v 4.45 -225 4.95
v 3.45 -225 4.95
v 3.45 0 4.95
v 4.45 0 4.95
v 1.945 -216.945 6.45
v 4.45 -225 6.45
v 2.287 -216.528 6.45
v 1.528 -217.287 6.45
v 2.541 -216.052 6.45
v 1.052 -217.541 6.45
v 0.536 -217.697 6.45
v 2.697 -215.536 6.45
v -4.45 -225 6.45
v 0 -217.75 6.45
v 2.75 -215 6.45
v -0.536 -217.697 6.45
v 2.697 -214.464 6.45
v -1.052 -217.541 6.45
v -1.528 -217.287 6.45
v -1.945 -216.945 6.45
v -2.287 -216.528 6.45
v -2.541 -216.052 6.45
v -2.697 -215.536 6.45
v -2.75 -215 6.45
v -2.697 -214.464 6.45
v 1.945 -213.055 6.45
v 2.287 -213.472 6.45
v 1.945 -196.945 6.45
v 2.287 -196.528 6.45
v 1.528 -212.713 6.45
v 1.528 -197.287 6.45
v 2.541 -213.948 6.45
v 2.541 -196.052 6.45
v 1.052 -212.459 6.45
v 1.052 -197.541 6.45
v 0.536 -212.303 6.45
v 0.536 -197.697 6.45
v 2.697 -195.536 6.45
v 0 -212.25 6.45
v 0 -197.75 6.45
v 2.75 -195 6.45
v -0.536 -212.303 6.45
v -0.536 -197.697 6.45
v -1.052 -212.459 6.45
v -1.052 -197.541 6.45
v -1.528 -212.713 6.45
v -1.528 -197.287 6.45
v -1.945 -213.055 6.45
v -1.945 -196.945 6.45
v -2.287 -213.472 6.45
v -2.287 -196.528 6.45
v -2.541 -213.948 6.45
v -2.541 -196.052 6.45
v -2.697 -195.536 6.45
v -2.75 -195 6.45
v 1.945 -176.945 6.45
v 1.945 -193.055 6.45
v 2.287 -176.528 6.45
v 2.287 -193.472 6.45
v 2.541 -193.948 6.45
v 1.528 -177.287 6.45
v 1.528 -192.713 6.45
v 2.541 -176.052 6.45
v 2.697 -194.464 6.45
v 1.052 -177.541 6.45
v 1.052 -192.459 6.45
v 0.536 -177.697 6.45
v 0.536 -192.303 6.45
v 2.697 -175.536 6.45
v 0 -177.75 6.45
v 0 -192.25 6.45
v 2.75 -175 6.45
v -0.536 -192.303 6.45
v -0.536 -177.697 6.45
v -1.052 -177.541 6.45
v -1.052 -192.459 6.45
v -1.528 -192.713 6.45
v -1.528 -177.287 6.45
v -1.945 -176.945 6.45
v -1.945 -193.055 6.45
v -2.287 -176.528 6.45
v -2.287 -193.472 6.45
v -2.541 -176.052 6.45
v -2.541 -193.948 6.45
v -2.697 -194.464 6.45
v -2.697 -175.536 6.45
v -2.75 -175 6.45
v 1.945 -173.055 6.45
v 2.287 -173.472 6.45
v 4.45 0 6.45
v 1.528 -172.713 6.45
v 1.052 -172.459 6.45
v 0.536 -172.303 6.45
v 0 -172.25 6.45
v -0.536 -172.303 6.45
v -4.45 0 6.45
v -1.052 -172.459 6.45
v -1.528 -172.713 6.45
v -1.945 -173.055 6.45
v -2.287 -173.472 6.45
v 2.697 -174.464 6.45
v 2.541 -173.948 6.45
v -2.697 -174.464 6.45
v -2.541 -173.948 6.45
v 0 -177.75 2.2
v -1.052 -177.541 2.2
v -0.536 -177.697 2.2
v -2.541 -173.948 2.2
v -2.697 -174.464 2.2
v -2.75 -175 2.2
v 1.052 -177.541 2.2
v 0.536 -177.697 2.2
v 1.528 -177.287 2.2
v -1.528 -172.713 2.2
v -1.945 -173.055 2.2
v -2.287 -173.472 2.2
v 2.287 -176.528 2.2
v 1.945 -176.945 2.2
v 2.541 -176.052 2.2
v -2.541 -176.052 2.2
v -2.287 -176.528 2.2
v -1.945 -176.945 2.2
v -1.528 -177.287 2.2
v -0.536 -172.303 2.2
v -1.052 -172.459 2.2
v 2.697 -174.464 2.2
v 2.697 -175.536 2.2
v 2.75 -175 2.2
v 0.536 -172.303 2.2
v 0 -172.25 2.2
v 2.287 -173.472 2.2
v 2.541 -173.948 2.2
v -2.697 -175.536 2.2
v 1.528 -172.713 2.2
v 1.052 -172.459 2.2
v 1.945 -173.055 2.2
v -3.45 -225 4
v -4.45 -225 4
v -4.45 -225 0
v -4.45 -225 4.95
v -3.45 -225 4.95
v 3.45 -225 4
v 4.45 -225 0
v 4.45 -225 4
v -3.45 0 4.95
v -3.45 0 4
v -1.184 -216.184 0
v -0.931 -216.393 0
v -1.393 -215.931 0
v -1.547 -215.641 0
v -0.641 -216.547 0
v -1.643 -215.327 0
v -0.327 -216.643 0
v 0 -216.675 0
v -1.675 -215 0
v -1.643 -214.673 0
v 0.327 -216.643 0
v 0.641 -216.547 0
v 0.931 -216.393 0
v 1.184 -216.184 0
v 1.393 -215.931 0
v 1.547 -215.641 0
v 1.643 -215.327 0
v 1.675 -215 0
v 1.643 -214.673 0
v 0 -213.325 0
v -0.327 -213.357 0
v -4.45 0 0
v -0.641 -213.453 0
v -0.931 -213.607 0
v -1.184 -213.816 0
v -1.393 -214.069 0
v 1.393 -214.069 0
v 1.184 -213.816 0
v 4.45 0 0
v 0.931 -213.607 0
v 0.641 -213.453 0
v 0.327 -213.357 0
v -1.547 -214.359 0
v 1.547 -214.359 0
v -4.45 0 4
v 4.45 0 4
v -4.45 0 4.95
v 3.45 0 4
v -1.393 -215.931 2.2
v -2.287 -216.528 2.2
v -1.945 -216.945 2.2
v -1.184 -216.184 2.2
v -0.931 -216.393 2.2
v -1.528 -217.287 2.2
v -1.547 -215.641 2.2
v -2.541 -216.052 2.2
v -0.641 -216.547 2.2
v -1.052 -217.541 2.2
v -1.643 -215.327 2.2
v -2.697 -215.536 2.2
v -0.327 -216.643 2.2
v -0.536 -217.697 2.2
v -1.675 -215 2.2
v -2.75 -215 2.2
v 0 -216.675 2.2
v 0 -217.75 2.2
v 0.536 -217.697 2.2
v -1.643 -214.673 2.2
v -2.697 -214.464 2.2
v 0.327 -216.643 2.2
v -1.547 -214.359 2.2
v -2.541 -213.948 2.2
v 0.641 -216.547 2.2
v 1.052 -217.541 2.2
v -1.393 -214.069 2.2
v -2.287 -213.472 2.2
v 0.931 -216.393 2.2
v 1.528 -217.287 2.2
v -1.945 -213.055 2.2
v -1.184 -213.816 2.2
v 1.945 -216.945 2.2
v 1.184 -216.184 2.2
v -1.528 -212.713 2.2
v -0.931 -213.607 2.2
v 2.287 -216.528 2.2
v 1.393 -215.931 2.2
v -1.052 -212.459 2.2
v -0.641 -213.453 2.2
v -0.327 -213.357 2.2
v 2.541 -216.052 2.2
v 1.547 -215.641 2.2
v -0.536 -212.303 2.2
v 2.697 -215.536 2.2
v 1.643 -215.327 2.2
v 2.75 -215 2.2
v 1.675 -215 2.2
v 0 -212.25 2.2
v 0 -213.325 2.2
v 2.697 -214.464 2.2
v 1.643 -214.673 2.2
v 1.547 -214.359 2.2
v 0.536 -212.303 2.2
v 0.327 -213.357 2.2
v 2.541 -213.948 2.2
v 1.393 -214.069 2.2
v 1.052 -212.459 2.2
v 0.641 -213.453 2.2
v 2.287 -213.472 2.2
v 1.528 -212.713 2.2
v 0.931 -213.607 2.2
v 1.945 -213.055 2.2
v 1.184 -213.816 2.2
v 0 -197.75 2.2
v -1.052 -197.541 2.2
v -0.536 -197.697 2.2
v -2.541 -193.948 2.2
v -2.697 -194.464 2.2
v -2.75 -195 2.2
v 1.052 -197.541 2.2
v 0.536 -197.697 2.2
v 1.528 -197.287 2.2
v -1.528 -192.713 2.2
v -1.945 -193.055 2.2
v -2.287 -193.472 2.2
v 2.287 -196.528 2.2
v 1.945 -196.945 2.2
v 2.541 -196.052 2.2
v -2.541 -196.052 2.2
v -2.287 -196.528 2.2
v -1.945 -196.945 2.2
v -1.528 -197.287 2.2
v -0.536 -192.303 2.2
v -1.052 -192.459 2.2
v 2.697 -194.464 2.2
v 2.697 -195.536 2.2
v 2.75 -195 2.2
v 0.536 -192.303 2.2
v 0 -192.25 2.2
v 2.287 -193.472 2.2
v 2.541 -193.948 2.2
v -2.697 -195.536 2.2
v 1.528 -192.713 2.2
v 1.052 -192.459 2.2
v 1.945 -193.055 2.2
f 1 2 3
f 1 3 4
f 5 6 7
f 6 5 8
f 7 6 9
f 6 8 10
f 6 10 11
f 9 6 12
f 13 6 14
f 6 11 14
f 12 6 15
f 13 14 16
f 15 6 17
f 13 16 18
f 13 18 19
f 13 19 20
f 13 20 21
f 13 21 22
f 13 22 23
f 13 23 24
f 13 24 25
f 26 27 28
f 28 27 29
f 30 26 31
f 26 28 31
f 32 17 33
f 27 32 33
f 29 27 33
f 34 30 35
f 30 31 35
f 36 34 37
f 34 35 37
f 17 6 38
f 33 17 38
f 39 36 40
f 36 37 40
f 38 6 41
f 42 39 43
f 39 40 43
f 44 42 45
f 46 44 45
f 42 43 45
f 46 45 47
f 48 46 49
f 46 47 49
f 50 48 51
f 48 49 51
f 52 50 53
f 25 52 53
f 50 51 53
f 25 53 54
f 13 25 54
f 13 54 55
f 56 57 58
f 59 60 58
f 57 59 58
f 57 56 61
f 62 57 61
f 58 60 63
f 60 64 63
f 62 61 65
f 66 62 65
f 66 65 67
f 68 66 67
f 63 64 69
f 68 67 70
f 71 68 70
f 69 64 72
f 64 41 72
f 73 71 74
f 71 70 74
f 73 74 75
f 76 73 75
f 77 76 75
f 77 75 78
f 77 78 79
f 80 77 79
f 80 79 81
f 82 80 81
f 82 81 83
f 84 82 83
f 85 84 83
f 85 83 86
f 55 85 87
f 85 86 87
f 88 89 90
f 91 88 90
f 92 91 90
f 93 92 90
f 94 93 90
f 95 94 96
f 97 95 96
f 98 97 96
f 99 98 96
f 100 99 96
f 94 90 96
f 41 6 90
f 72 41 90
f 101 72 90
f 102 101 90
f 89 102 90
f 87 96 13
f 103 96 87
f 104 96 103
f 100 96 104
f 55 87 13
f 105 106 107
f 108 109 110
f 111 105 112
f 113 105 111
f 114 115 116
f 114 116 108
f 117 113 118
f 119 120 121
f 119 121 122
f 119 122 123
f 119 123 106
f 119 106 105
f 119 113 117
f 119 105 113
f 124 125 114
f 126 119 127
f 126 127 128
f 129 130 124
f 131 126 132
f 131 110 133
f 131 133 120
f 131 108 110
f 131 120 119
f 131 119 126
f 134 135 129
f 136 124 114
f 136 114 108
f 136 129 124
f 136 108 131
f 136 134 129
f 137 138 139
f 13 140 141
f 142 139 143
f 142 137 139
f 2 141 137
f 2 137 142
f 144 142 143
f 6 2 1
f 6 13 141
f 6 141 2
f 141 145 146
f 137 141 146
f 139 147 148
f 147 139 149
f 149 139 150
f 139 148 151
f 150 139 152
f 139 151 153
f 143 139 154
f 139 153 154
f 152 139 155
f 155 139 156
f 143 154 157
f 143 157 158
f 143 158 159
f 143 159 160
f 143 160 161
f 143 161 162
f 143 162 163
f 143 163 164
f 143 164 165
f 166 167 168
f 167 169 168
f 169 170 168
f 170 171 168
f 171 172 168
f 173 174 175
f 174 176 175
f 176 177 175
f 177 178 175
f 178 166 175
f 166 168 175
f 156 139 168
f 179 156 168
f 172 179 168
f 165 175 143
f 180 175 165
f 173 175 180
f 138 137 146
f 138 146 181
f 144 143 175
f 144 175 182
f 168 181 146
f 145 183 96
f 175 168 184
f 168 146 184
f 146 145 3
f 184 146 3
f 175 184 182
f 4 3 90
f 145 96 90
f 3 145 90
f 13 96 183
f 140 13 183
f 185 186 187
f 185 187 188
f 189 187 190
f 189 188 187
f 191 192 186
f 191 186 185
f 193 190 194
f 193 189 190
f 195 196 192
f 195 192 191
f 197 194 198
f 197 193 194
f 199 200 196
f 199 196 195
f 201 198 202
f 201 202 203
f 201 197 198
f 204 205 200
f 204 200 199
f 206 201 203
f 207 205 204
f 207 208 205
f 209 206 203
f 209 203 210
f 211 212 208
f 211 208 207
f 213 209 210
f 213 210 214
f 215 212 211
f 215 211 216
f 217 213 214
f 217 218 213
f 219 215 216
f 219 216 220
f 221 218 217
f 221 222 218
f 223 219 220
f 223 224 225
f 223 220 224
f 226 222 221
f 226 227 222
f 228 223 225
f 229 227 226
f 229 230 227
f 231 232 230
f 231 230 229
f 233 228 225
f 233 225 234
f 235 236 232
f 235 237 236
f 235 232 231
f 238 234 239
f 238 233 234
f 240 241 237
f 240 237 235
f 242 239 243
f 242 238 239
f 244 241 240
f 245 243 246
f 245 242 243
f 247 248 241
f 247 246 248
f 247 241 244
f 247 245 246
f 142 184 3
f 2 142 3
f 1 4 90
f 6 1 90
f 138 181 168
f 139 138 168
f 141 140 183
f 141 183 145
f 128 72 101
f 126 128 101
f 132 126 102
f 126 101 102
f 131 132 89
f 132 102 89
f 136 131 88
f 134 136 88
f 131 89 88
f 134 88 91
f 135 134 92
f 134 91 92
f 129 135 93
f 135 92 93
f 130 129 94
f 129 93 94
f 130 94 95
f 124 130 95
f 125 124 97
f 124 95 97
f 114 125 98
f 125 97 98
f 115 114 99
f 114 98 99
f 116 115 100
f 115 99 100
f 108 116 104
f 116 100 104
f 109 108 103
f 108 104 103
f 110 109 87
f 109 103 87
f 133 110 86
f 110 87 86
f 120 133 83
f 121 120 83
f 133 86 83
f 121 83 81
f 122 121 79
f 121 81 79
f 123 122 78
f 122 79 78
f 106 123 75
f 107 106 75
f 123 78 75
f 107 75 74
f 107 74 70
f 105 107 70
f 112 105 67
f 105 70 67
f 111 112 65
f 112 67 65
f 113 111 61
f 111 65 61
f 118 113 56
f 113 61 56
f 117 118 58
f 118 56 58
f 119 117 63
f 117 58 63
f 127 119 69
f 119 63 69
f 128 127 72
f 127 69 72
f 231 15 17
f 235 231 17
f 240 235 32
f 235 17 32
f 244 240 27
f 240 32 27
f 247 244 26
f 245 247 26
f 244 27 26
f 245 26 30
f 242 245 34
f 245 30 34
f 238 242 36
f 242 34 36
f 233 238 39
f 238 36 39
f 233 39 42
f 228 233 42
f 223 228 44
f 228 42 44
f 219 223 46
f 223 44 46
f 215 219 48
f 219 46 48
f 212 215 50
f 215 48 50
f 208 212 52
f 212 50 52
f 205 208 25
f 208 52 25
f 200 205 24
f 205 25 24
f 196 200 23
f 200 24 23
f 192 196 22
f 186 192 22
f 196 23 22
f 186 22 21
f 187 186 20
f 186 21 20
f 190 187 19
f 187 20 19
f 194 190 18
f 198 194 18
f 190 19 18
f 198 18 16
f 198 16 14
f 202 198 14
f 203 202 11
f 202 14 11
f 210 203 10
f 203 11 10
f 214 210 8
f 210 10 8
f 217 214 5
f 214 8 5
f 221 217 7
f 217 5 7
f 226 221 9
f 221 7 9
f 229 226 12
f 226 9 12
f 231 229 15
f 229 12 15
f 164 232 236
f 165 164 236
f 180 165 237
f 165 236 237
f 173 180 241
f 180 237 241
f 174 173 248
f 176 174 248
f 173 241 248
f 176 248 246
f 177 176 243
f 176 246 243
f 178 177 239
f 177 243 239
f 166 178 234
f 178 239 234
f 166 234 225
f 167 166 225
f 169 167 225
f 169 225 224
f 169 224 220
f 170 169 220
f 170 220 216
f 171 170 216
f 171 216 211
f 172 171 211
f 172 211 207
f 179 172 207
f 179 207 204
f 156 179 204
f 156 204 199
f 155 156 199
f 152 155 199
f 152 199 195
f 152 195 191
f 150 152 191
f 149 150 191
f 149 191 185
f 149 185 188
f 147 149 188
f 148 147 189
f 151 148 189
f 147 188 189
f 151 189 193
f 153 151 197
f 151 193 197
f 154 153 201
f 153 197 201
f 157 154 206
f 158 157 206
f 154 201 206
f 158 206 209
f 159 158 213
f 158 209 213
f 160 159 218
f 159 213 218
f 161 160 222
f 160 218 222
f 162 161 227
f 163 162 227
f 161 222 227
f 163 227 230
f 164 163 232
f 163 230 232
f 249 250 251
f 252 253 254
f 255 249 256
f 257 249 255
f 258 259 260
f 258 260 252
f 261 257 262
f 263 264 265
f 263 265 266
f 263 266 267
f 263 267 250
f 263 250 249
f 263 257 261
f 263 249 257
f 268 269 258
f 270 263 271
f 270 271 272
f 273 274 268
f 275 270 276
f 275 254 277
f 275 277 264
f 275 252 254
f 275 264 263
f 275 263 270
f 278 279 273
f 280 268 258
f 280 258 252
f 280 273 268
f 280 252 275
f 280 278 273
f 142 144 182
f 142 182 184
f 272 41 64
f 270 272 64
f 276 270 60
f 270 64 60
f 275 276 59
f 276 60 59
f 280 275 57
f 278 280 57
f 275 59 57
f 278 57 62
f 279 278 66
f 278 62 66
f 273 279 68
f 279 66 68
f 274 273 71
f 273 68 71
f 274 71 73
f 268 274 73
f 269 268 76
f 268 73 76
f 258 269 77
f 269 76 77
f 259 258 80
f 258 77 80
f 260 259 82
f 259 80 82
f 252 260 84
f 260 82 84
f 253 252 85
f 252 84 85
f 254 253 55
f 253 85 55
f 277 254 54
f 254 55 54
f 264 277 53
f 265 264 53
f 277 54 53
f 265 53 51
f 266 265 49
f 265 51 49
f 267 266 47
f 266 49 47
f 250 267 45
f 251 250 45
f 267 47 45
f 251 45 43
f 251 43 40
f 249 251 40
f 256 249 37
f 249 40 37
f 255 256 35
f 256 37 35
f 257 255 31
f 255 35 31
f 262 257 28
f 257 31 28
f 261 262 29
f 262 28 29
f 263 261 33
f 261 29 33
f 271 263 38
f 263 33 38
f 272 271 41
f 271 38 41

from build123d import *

# Parameters (mm, degrees)
F1_DEPTH = 225
F2_R     = 2.75
F3_DEPTH = 4.25
F4_R     = 1.675
F5_DEPTH = 2.201


with BuildPart() as f1:
    # F0 (on Front) → F1 (new body)
    with BuildSketch(Plane.XZ):
        Polygon((-4.45, 4), (-4.45, 0), (4.45, 0), (4.45, 4), (3.45, 4), (3.45, 4.95), (4.45, 4.95), (4.45, 6.45), (-4.45, 6.45), (-4.45, 4.95), (-3.45, 4.95), (-3.45, 4), align=None)
    extrude(amount=F1_DEPTH)

    # F2 (on face) → F3 (cut)
    with BuildSketch(Plane.XY.offset(6.45)):
        with Locations((0, -215)):
            Circle(F2_R)
        with Locations((0, -195)):
            Circle(F2_R)
        with Locations((0, -175)):
            Circle(F2_R)
    extrude(amount=-F3_DEPTH, mode=Mode.SUBTRACT)

    # F4 (on face) → F5 (cut, through all)
    with BuildSketch(Plane.XY.offset(2.2)):
        with Locations((0, -215)):
            Circle(F4_R)
    extrude(amount=-F5_DEPTH, mode=Mode.SUBTRACT)


solid = f1.part
